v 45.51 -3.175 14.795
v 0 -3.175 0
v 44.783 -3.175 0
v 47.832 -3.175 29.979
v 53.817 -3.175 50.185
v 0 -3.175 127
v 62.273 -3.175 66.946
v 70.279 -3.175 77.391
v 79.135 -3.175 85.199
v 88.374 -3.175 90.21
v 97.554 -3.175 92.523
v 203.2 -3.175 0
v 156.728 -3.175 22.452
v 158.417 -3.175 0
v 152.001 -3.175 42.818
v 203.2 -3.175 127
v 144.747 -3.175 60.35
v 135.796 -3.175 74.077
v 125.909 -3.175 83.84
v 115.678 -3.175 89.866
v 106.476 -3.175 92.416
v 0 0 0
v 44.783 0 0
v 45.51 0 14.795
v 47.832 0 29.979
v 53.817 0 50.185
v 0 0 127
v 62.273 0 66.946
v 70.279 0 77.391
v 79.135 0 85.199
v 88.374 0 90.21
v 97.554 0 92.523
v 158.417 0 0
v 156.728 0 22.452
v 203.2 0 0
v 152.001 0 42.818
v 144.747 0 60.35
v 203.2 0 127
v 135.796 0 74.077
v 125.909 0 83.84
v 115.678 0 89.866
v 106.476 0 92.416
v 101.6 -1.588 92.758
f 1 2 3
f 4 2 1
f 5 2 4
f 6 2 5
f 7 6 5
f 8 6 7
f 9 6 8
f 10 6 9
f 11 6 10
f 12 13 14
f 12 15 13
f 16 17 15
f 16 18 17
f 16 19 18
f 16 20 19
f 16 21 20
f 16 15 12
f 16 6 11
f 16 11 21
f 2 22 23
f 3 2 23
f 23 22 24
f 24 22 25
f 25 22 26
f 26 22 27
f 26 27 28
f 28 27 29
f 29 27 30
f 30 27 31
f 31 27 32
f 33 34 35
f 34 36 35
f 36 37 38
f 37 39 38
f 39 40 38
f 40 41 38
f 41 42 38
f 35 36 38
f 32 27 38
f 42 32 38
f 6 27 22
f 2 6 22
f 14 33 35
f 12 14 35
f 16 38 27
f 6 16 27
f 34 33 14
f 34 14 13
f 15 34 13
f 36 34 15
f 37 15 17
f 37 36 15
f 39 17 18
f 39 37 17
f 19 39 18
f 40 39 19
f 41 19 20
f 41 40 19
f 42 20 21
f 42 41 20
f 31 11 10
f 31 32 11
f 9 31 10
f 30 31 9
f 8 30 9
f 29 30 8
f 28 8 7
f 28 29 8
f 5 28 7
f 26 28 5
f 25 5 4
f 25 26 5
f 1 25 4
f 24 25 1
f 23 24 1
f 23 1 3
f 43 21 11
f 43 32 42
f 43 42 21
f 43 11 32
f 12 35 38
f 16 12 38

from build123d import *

# Parameters (mm, degrees)
F1_DEPTH = 3.175


with BuildPart() as f1:
    # F0 (on Front) → F1 (new body)
    with BuildSketch(Plane.XZ):
        with BuildLine():
            Line((0, 127), (0, 0))
            Line((0, 0), (44.7828951552, 0))
            add(Edge.make_bspline(
                [(158.4171048448, 0), (158.4171048448, 92.7580967546), (101.6, 92.7580967546), (44.7828951552, 92.7580967546), (44.7828951552, 0)],
                knots=[4.7123889804, 4.7123889804, 4.7123889804, 6.2831853072, 6.2831853072, 7.853981634, 7.853981634, 7.853981634], degree=2, weights=[1, 0.7071067812, 1, 0.7071067812, 1]))
            Line((158.4171048448, 0), (203.2, 0))
            Line((203.2, 0), (203.2, 127))
            Line((203.2, 127), (0, 127))
        make_face()
    extrude(amount=F1_DEPTH)


solid = f1.part
